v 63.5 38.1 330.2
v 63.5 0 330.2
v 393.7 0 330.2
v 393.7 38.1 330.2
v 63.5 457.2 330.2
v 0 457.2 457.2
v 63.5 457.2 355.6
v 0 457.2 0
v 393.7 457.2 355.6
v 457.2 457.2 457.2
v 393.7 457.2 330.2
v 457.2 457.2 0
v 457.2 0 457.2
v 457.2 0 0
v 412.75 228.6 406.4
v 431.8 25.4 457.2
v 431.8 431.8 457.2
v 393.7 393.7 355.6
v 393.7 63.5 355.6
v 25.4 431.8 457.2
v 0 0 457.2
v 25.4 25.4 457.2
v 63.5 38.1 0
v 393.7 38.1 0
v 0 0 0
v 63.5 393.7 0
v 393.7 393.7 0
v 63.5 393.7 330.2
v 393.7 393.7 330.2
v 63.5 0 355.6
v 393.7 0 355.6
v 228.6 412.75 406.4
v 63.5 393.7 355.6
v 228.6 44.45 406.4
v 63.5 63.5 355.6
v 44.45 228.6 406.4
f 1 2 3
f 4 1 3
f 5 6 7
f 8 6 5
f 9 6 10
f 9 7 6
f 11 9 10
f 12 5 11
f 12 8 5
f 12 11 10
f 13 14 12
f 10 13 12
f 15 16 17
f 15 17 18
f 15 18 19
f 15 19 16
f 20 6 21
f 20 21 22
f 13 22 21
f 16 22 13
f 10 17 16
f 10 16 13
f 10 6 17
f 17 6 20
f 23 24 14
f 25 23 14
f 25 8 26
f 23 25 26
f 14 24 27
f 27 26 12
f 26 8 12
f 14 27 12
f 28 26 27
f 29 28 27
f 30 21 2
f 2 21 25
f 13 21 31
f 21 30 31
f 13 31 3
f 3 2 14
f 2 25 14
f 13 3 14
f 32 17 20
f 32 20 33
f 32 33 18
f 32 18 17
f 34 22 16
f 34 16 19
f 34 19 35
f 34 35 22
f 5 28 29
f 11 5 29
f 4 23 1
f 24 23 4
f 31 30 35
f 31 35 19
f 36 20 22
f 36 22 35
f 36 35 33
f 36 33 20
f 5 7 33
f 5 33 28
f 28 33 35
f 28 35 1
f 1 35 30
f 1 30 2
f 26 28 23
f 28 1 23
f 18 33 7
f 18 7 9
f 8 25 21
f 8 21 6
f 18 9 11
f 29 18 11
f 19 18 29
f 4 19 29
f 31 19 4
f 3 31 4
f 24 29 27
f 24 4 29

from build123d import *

# Parameters (mm, degrees)
SKETCH1_W               = 457.2
SKETCH1_H               = 457.2
BOSS_EXTRUDE1_DEPTH     = 457.2
SKETCH4_W               = 330.2
SKETCH4_H               = 330.2
CUT_EXTRUDE1_DEPTH      = 457.2
SKETCH5_W               = 330.2
SKETCH5_H               = 355.6
CUT_EXTRUDE2_DEPTH      = 25.4
CUT_EXTRUDE3_DEPTH      = 792.893629278
CUT_EXTRUDE3_DEPTH_BACK = 792.893629278
SKETCH7_W               = 330.2
SKETCH7_H               = 25.4


with BuildPart() as part:
    # Sketch1 → Boss-Extrude1 (new body)
    with BuildSketch(Plane.XY):
        with Locations((228.6, 228.6)):
            Rectangle(SKETCH1_W, SKETCH1_H)
    extrude(amount=BOSS_EXTRUDE1_DEPTH)

    # Sketch2 → Cut-Loft1 section 0
    with BuildSketch(Plane.XY.offset(457.2)):
        with BuildLine():
            Line((25.4, 25.4), (431.8, 25.4))
            Line((431.8, 25.4), (431.8, 431.8))
            Line((431.8, 431.8), (25.4, 431.8))
            Line((25.4, 431.8), (25.4, 25.4))
        make_face()
    # Sketch3 → Cut-Loft1 section 1
    with BuildSketch(Plane.XY.offset(355.6)):
        with BuildLine():
            Line((63.5, 63.5), (393.7, 63.5))
            Line((393.7, 63.5), (393.7, 393.7))
            Line((393.7, 393.7), (63.5, 393.7))
            Line((63.5, 393.7), (63.5, 63.5))
        make_face()
    loft(mode=Mode.SUBTRACT)

    # Sketch4 → Cut-Extrude1 (cut)
    with BuildSketch(Plane.XY.offset(355.6)):
        with Locations((228.6, 228.6)):
            Rectangle(SKETCH4_W, SKETCH4_H)
    extrude(amount=-CUT_EXTRUDE1_DEPTH, mode=Mode.SUBTRACT)

    # Sketch5 → Cut-Extrude2 (cut)
    with BuildSketch(Plane(origin=(0, 63.5, 0), x_dir=(1, 0, 0), z_dir=(0, 1, 0))):
        with Locations((228.6, -177.8)):
            Rectangle(SKETCH5_W, SKETCH5_H)
    extrude(amount=-CUT_EXTRUDE2_DEPTH, mode=Mode.SUBTRACT)

    # Sketch7 → Cut-Extrude3 (cut, two sides: drawn at the far end of the back side and taken through both)
    with BuildSketch(Plane(origin=(0, 457.2, 0), x_dir=(1, 0, 0), z_dir=(0, 1, 0)).offset(-CUT_EXTRUDE3_DEPTH_BACK)):
        with Locations((228.6, -342.9)):
            Rectangle(SKETCH7_W, SKETCH7_H)
    extrude(amount=CUT_EXTRUDE3_DEPTH + CUT_EXTRUDE3_DEPTH_BACK, mode=Mode.SUBTRACT)


solid = part.part
